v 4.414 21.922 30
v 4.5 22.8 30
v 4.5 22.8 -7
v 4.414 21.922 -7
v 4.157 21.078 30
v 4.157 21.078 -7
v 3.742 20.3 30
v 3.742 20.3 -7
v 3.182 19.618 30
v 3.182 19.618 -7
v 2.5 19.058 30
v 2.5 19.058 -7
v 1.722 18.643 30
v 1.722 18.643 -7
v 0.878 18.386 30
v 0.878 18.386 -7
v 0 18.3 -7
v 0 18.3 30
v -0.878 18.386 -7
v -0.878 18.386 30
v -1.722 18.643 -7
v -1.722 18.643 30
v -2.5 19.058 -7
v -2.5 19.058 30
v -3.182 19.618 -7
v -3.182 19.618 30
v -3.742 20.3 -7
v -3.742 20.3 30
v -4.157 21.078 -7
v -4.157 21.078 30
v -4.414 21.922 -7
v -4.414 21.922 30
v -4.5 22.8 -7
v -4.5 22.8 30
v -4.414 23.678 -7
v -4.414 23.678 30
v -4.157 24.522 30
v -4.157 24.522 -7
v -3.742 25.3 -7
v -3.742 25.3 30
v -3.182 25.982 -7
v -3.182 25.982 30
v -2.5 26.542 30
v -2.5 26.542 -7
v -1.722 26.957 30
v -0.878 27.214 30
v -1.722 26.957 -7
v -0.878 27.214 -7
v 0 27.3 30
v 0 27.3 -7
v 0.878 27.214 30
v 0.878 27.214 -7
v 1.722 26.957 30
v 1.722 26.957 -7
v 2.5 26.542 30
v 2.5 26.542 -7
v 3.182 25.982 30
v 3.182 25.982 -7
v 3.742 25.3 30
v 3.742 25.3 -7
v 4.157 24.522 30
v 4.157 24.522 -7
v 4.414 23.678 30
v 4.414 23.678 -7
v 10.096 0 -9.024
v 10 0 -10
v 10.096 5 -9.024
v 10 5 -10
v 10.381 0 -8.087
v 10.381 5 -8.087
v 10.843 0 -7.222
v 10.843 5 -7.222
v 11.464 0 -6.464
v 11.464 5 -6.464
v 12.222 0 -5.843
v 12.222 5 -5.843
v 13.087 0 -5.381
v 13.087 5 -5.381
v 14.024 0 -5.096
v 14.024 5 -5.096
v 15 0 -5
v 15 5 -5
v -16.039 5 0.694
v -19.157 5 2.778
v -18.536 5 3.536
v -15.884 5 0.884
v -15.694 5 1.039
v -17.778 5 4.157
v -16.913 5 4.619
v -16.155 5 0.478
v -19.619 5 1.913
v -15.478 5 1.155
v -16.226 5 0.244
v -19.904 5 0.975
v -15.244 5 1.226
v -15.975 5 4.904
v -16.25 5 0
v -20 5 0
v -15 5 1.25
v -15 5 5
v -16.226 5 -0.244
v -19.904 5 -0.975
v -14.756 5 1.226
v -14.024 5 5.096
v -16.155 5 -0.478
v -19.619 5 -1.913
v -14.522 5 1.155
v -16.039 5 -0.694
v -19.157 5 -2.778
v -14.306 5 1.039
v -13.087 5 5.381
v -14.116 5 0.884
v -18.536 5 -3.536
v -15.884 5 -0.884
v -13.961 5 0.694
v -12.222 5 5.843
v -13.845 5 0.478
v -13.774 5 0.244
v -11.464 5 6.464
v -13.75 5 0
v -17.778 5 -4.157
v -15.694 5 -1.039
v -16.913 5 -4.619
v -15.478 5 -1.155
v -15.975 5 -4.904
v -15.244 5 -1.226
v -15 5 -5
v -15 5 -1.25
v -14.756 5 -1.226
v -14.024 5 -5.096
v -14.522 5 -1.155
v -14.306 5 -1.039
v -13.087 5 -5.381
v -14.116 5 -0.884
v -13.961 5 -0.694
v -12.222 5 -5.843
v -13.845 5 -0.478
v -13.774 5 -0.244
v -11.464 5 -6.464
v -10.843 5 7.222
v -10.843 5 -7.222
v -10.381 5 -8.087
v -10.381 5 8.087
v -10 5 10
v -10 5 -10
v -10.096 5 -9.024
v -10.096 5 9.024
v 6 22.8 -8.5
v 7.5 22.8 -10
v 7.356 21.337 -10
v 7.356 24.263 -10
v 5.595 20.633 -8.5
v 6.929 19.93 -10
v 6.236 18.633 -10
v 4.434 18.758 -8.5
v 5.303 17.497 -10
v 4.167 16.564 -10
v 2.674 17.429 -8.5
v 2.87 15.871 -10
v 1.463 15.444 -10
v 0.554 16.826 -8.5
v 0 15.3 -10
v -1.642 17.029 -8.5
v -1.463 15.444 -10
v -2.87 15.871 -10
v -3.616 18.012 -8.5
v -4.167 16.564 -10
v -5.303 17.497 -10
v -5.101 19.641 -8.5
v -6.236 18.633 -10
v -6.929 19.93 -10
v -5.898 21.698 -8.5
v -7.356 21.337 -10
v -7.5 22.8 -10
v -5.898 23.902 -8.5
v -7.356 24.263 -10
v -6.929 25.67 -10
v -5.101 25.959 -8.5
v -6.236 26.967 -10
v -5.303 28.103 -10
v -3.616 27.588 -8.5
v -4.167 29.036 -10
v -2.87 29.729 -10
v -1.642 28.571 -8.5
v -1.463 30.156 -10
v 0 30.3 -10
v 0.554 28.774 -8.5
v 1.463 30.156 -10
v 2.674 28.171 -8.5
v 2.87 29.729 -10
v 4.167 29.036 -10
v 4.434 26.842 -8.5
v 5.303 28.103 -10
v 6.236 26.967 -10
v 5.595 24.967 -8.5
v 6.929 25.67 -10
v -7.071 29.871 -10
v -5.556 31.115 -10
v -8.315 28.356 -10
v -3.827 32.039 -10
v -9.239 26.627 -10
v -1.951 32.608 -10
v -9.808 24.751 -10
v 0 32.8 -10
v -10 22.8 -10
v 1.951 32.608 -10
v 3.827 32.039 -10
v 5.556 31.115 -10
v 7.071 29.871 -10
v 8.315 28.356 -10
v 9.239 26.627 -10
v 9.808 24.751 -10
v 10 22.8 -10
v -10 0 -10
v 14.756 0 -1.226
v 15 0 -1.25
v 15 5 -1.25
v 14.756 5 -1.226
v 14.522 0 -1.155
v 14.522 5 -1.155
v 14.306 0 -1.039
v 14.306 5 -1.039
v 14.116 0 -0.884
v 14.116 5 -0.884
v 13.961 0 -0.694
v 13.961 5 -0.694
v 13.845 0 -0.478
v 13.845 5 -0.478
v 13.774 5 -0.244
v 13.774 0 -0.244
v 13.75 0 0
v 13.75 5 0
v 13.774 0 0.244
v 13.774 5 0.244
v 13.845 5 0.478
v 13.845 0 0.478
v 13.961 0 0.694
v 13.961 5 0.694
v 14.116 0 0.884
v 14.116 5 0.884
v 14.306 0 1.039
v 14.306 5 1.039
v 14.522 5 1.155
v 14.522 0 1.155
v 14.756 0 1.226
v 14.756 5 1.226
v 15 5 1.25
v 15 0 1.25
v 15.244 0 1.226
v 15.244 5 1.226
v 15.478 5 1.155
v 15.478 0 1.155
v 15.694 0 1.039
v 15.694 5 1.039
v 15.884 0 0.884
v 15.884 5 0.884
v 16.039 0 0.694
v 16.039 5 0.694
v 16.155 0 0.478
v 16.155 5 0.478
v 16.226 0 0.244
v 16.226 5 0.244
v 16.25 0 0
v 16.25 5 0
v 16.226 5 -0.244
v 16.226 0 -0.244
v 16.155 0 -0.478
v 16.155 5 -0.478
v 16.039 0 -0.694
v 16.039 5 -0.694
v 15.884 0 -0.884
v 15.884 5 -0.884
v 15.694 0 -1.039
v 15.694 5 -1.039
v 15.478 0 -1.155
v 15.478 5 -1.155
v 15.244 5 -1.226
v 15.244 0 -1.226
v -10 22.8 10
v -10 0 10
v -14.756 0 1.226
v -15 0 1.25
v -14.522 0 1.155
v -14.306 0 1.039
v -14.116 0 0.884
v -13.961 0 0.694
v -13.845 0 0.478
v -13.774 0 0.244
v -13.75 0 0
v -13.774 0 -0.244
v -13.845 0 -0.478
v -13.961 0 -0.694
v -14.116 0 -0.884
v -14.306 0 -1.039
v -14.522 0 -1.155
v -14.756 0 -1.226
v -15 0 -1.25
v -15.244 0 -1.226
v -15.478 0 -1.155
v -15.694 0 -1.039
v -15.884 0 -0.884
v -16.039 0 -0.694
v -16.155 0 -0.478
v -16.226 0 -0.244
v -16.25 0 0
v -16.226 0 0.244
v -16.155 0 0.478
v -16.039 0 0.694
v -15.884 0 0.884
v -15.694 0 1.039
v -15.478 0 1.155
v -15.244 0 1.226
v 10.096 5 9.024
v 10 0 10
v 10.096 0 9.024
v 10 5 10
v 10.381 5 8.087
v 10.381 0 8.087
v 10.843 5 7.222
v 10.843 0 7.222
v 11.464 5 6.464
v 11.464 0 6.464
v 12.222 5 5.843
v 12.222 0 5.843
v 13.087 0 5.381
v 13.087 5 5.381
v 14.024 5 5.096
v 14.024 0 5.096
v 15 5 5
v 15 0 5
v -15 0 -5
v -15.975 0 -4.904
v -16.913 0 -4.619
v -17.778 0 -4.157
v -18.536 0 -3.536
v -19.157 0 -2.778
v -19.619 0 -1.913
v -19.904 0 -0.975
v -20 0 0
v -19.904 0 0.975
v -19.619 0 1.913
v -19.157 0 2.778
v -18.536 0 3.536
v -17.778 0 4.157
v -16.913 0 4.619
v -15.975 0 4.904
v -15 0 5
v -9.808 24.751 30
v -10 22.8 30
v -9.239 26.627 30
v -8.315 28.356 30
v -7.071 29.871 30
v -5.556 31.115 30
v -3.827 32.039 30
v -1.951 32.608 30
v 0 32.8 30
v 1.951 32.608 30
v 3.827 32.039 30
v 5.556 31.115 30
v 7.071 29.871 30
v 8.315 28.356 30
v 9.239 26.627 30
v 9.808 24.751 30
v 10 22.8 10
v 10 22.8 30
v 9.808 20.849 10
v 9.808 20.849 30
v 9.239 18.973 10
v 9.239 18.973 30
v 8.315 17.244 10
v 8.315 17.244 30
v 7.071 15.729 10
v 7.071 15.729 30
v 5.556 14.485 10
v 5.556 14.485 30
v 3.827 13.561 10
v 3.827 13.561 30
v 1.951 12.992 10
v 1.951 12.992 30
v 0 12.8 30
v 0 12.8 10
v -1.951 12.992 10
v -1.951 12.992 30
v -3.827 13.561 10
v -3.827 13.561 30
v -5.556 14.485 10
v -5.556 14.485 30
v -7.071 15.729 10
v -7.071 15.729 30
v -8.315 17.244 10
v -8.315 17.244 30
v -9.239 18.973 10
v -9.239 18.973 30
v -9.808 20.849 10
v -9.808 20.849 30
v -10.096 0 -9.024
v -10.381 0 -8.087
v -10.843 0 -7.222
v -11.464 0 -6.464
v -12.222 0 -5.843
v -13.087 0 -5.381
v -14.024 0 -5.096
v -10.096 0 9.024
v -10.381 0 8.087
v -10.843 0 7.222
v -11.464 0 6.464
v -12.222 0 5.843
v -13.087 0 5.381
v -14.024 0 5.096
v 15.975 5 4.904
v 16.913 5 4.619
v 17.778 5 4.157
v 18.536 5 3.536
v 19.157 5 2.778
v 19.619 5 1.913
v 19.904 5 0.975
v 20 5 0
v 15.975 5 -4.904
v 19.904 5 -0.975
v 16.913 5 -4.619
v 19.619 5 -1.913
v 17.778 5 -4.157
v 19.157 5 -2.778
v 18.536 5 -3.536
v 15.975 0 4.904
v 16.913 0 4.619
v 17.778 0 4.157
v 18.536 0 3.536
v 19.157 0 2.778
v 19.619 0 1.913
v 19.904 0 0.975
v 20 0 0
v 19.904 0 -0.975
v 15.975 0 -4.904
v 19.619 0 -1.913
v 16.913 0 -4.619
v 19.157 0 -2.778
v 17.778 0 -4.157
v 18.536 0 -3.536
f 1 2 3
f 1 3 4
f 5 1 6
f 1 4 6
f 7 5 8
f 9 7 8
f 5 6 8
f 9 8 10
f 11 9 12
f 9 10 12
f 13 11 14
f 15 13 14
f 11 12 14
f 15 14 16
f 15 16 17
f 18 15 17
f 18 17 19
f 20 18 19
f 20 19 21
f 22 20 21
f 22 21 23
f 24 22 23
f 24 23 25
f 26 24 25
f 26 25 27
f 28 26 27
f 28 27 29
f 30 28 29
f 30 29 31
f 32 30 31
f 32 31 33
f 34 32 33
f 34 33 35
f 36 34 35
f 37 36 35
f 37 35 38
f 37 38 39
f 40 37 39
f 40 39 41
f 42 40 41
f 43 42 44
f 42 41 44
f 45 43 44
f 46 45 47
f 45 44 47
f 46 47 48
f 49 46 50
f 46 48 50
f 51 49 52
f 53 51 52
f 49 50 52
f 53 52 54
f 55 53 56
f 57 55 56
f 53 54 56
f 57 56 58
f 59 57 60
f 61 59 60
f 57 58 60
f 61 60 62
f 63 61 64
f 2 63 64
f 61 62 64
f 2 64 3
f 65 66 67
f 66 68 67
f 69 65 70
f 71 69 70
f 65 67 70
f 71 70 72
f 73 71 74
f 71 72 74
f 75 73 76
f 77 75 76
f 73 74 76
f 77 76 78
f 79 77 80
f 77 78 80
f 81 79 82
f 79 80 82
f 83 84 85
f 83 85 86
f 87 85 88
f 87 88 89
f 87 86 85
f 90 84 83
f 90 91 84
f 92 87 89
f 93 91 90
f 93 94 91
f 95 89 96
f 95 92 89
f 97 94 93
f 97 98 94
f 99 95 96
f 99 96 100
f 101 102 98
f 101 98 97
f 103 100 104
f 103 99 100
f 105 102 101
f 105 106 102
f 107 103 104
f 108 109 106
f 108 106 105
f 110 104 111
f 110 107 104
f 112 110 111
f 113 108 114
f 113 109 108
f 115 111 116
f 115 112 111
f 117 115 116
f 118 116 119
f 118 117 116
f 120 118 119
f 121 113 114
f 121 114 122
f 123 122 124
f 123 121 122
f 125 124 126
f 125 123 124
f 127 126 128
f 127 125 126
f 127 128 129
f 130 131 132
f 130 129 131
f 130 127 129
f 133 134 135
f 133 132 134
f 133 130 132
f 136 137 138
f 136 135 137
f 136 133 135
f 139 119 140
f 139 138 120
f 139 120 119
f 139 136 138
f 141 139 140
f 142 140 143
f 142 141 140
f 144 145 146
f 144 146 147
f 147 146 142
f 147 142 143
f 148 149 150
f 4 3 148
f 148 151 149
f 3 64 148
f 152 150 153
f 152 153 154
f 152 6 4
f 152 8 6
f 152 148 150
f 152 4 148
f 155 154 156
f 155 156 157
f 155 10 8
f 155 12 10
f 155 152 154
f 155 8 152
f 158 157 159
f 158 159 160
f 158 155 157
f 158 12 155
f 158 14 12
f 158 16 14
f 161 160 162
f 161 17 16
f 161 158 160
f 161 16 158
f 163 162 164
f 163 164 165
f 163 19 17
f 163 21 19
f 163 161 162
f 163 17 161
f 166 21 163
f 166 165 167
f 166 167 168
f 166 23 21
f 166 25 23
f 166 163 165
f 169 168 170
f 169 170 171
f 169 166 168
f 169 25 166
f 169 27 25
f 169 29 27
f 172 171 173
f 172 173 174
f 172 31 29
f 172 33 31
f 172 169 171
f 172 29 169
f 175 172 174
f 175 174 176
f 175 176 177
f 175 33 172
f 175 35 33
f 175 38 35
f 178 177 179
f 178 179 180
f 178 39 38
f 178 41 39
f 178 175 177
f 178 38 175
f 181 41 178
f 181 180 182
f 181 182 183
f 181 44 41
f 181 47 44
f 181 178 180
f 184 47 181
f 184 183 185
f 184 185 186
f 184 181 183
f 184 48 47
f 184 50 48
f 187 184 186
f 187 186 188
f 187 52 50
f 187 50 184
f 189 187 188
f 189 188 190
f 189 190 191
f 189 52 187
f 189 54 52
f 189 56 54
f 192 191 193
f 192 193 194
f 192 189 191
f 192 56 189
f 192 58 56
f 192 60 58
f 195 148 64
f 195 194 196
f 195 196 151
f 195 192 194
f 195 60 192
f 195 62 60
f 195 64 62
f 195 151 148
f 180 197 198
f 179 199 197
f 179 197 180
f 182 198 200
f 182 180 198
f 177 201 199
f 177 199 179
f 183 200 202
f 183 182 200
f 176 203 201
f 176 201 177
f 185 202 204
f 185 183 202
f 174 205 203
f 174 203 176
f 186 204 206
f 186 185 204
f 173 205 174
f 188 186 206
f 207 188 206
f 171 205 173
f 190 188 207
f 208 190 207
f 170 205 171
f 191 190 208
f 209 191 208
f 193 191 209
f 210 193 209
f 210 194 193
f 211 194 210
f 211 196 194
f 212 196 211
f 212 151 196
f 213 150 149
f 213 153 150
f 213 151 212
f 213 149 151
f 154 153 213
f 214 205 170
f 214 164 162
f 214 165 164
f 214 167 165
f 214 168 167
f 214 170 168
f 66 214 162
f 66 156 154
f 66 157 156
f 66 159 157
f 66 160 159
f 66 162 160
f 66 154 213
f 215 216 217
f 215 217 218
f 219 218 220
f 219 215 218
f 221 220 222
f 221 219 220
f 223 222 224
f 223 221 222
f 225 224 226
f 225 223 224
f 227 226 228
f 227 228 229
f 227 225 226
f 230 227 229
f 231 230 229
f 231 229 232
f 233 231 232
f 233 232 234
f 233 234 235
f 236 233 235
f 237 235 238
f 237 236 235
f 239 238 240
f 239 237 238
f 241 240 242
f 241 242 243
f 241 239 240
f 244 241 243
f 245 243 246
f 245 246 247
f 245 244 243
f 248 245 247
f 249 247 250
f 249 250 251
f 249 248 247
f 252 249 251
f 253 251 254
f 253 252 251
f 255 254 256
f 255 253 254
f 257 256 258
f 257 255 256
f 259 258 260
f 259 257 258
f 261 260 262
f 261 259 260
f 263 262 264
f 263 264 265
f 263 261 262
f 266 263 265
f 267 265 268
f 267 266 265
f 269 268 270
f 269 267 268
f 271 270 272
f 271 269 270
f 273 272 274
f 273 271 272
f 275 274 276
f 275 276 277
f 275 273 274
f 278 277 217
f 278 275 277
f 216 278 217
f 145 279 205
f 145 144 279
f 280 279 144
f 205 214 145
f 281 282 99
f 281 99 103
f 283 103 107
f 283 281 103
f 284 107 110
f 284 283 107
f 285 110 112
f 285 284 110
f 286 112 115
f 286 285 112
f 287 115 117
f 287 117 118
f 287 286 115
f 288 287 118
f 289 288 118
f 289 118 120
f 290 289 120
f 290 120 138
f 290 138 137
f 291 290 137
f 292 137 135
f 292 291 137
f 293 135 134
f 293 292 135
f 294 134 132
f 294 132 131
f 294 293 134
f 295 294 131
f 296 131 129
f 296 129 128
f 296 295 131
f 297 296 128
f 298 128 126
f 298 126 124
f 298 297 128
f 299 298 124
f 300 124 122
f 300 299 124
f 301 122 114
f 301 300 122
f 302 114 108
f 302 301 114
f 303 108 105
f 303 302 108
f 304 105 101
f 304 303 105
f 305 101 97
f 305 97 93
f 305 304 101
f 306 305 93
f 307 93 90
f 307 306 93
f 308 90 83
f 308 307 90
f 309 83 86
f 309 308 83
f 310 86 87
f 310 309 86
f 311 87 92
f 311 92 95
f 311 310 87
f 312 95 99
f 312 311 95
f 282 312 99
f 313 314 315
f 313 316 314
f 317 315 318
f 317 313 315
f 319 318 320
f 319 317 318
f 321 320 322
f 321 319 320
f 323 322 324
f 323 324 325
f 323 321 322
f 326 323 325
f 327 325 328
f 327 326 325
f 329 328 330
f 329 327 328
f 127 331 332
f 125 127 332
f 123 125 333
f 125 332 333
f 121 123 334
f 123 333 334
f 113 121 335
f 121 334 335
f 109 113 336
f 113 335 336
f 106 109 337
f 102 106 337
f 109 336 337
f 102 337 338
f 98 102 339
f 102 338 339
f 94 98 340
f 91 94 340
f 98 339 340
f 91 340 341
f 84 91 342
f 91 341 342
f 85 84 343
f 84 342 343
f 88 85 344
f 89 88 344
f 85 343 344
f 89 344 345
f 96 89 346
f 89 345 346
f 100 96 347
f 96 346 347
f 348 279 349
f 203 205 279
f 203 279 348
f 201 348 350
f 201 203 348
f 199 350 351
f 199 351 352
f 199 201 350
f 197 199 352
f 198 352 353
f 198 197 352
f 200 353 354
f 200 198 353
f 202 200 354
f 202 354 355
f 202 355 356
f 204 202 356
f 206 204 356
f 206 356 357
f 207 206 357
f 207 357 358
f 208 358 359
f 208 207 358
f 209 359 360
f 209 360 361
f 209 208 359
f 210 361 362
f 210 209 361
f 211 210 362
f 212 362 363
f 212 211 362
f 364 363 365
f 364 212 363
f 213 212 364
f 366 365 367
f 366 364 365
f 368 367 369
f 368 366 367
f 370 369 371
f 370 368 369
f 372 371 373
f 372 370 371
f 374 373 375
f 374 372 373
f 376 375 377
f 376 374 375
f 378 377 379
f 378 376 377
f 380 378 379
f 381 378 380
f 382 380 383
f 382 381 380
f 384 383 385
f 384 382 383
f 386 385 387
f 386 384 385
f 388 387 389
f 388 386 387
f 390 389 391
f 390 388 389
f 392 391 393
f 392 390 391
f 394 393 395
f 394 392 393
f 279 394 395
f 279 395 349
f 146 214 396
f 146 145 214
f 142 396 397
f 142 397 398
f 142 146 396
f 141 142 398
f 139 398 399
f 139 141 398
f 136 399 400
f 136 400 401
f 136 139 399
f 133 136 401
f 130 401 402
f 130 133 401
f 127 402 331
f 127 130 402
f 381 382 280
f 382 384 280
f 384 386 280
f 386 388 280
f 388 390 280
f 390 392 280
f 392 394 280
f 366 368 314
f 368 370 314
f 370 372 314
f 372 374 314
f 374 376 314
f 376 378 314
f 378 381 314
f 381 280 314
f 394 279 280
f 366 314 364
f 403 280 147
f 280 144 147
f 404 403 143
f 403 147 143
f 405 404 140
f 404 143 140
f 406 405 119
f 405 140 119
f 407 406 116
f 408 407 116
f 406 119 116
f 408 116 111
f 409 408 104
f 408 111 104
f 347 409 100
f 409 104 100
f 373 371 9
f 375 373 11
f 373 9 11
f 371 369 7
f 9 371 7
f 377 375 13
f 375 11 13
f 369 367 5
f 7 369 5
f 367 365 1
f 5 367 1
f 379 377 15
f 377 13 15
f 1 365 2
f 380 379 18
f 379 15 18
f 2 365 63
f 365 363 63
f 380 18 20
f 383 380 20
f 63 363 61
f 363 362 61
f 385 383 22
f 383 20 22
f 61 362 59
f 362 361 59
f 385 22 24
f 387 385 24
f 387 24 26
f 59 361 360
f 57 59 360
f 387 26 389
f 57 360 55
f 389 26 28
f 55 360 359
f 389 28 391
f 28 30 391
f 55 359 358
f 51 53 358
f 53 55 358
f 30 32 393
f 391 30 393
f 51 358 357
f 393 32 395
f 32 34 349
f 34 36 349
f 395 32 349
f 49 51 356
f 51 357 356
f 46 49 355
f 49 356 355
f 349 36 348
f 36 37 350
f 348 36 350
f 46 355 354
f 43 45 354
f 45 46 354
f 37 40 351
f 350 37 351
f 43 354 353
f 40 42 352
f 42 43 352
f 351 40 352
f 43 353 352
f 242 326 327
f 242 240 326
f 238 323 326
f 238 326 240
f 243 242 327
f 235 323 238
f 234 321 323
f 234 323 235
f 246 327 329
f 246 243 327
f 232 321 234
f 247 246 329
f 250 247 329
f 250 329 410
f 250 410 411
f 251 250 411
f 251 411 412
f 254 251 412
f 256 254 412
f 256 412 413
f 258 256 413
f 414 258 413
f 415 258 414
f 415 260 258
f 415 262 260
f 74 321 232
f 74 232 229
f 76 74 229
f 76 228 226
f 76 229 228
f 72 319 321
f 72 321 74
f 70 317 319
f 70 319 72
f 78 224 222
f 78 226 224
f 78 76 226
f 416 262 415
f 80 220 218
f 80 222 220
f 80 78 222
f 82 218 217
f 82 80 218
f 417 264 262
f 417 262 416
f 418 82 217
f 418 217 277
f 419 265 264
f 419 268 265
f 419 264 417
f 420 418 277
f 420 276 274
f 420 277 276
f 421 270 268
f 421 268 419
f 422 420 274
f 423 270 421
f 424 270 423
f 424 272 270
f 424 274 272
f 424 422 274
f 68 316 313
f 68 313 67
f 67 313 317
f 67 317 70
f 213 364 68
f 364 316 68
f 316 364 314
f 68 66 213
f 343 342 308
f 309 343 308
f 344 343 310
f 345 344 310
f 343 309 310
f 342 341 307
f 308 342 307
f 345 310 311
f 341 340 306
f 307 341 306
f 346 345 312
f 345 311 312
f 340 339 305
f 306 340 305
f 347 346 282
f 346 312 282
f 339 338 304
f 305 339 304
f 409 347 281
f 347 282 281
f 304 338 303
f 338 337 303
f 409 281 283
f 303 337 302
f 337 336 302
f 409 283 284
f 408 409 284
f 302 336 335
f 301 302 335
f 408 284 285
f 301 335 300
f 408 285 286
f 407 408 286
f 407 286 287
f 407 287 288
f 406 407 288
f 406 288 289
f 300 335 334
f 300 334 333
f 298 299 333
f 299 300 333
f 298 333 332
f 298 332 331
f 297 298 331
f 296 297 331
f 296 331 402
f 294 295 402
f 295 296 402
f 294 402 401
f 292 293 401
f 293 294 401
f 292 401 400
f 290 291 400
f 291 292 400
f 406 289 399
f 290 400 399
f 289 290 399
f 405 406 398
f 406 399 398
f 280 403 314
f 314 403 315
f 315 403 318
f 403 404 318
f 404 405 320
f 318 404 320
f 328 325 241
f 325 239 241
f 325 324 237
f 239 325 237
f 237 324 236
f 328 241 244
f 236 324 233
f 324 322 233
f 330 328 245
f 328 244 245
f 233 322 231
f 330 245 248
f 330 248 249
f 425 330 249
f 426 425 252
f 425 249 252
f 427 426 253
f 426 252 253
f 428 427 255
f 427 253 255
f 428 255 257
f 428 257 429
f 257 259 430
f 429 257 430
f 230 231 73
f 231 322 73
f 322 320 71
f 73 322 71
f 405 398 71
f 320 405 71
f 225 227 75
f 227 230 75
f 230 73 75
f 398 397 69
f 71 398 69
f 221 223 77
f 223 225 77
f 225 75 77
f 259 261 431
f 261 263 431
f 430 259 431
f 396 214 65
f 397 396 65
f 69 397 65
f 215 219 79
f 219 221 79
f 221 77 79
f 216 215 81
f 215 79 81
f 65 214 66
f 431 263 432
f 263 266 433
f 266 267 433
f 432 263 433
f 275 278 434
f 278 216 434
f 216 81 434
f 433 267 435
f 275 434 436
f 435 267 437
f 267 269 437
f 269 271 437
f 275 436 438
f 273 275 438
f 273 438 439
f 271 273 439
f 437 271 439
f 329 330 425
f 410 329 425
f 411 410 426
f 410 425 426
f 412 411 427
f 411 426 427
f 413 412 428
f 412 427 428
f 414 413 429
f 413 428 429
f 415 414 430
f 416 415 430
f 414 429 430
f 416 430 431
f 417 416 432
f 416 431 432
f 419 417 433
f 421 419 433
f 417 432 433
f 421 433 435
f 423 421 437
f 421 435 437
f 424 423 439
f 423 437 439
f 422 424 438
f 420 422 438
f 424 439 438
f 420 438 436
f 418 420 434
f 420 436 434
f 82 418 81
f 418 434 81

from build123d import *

# Parameters (mm, degrees)
SKETCH1_R           = 1.25
BOSS_EXTRUDE1_DEPTH = 5
SKETCH2_W           = 20
SKETCH2_H           = 20
BOSS_EXTRUDE2_DEPTH = 17.8
SKETCH3_R           = 10
BOSS_EXTRUDE3_DEPTH = 40
CUT_EXTRUDE1_DEPTH  = 56.46025604
FILLET1_R           = 5
CHAMFER2_SIZE       = 3


with BuildPart() as part:
    # Sketch1 → Boss-Extrude1 (new body)
    with BuildSketch(Plane(origin=(0, 0, 0), x_dir=(1, 0, 0), z_dir=(0, 1, 0))):
        with BuildLine():
            Line((-10, -10), (10, -10))
            Line((10, -10), (10, -5))
            Line((10, -5), (15, -5))
            ThreePointArc((15, -5), (20, 0), (15, 5))
            Line((15, 5), (10, 5))
            Line((10, 5), (10, 10))
            Line((10, 10), (-10, 10))
            Line((-10, 10), (-10, 5))
            Line((-10, 5), (-15, 5))
            ThreePointArc((-15, 5), (-20, 0), (-15, -5))
            Line((-15, -5), (-10, -5))
            Line((-10, -5), (-10, -10))
        make_face()
        with Locations(Location((-15, 0, 0), (0, 0, 270))):
            Circle(SKETCH1_R, mode=Mode.SUBTRACT)
        with Locations(Location((15, 0, 0), (0, 0, 90))):
            Circle(SKETCH1_R, mode=Mode.SUBTRACT)
    extrude(amount=BOSS_EXTRUDE1_DEPTH)

    # Sketch2 → Boss-Extrude2 (add)
    with BuildSketch(Plane(origin=(0, 5, 0), x_dir=(1, 0, 0), z_dir=(0, 1, 0))):
        Rectangle(SKETCH2_W, SKETCH2_H)
    extrude(amount=BOSS_EXTRUDE2_DEPTH)

    # Sketch3 → Boss-Extrude3 (add)
    with BuildSketch(Plane(origin=(0, 0, -10), x_dir=(-1, 0, 0), z_dir=(0, 0, -1))):
        with Locations((0, 22.8)):
            Circle(SKETCH3_R)
    extrude(amount=-BOSS_EXTRUDE3_DEPTH)

    # Sketch3<3> → Cut-Extrude1 (cut, through all)
    with BuildSketch(Plane(origin=(0, 0, -10), x_dir=(-1, 0, 0), z_dir=(0, 0, -1))):
        with BuildLine():
            Line((-4.5, 22.8), (4.5, 22.8))
            ThreePointArc((4.5, 22.8), (0, 27.3), (-4.5, 22.8))
        make_face()
        with BuildLine():
            ThreePointArc((-4.5, 22.8), (0, 18.3), (4.5, 22.8))
            Line((4.5, 22.8), (-4.5, 22.8))
        make_face()
    extrude(amount=-CUT_EXTRUDE1_DEPTH, mode=Mode.SUBTRACT)

    # Fillet1
    fillet1_edges = [part.edges().sort_by_distance(p)[0] for p in [
        (10, 2.5, -5),
        (10, 2.5, 5),
        (-10, 2.5, 5),
        (-10, 2.5, -5),
    ]]
    fillet(fillet1_edges, radius=FILLET1_R - 0.0001)  # a hair under: the kernel refuses the full size

    # Chamfer2
    chamfer2_edges = [part.edges().sort_by_distance(p)[0] for p in [
        (4.5, 22.8, -10),
    ]]
    chamfer(chamfer2_edges, length=CHAMFER2_SIZE)


solid = part.part
